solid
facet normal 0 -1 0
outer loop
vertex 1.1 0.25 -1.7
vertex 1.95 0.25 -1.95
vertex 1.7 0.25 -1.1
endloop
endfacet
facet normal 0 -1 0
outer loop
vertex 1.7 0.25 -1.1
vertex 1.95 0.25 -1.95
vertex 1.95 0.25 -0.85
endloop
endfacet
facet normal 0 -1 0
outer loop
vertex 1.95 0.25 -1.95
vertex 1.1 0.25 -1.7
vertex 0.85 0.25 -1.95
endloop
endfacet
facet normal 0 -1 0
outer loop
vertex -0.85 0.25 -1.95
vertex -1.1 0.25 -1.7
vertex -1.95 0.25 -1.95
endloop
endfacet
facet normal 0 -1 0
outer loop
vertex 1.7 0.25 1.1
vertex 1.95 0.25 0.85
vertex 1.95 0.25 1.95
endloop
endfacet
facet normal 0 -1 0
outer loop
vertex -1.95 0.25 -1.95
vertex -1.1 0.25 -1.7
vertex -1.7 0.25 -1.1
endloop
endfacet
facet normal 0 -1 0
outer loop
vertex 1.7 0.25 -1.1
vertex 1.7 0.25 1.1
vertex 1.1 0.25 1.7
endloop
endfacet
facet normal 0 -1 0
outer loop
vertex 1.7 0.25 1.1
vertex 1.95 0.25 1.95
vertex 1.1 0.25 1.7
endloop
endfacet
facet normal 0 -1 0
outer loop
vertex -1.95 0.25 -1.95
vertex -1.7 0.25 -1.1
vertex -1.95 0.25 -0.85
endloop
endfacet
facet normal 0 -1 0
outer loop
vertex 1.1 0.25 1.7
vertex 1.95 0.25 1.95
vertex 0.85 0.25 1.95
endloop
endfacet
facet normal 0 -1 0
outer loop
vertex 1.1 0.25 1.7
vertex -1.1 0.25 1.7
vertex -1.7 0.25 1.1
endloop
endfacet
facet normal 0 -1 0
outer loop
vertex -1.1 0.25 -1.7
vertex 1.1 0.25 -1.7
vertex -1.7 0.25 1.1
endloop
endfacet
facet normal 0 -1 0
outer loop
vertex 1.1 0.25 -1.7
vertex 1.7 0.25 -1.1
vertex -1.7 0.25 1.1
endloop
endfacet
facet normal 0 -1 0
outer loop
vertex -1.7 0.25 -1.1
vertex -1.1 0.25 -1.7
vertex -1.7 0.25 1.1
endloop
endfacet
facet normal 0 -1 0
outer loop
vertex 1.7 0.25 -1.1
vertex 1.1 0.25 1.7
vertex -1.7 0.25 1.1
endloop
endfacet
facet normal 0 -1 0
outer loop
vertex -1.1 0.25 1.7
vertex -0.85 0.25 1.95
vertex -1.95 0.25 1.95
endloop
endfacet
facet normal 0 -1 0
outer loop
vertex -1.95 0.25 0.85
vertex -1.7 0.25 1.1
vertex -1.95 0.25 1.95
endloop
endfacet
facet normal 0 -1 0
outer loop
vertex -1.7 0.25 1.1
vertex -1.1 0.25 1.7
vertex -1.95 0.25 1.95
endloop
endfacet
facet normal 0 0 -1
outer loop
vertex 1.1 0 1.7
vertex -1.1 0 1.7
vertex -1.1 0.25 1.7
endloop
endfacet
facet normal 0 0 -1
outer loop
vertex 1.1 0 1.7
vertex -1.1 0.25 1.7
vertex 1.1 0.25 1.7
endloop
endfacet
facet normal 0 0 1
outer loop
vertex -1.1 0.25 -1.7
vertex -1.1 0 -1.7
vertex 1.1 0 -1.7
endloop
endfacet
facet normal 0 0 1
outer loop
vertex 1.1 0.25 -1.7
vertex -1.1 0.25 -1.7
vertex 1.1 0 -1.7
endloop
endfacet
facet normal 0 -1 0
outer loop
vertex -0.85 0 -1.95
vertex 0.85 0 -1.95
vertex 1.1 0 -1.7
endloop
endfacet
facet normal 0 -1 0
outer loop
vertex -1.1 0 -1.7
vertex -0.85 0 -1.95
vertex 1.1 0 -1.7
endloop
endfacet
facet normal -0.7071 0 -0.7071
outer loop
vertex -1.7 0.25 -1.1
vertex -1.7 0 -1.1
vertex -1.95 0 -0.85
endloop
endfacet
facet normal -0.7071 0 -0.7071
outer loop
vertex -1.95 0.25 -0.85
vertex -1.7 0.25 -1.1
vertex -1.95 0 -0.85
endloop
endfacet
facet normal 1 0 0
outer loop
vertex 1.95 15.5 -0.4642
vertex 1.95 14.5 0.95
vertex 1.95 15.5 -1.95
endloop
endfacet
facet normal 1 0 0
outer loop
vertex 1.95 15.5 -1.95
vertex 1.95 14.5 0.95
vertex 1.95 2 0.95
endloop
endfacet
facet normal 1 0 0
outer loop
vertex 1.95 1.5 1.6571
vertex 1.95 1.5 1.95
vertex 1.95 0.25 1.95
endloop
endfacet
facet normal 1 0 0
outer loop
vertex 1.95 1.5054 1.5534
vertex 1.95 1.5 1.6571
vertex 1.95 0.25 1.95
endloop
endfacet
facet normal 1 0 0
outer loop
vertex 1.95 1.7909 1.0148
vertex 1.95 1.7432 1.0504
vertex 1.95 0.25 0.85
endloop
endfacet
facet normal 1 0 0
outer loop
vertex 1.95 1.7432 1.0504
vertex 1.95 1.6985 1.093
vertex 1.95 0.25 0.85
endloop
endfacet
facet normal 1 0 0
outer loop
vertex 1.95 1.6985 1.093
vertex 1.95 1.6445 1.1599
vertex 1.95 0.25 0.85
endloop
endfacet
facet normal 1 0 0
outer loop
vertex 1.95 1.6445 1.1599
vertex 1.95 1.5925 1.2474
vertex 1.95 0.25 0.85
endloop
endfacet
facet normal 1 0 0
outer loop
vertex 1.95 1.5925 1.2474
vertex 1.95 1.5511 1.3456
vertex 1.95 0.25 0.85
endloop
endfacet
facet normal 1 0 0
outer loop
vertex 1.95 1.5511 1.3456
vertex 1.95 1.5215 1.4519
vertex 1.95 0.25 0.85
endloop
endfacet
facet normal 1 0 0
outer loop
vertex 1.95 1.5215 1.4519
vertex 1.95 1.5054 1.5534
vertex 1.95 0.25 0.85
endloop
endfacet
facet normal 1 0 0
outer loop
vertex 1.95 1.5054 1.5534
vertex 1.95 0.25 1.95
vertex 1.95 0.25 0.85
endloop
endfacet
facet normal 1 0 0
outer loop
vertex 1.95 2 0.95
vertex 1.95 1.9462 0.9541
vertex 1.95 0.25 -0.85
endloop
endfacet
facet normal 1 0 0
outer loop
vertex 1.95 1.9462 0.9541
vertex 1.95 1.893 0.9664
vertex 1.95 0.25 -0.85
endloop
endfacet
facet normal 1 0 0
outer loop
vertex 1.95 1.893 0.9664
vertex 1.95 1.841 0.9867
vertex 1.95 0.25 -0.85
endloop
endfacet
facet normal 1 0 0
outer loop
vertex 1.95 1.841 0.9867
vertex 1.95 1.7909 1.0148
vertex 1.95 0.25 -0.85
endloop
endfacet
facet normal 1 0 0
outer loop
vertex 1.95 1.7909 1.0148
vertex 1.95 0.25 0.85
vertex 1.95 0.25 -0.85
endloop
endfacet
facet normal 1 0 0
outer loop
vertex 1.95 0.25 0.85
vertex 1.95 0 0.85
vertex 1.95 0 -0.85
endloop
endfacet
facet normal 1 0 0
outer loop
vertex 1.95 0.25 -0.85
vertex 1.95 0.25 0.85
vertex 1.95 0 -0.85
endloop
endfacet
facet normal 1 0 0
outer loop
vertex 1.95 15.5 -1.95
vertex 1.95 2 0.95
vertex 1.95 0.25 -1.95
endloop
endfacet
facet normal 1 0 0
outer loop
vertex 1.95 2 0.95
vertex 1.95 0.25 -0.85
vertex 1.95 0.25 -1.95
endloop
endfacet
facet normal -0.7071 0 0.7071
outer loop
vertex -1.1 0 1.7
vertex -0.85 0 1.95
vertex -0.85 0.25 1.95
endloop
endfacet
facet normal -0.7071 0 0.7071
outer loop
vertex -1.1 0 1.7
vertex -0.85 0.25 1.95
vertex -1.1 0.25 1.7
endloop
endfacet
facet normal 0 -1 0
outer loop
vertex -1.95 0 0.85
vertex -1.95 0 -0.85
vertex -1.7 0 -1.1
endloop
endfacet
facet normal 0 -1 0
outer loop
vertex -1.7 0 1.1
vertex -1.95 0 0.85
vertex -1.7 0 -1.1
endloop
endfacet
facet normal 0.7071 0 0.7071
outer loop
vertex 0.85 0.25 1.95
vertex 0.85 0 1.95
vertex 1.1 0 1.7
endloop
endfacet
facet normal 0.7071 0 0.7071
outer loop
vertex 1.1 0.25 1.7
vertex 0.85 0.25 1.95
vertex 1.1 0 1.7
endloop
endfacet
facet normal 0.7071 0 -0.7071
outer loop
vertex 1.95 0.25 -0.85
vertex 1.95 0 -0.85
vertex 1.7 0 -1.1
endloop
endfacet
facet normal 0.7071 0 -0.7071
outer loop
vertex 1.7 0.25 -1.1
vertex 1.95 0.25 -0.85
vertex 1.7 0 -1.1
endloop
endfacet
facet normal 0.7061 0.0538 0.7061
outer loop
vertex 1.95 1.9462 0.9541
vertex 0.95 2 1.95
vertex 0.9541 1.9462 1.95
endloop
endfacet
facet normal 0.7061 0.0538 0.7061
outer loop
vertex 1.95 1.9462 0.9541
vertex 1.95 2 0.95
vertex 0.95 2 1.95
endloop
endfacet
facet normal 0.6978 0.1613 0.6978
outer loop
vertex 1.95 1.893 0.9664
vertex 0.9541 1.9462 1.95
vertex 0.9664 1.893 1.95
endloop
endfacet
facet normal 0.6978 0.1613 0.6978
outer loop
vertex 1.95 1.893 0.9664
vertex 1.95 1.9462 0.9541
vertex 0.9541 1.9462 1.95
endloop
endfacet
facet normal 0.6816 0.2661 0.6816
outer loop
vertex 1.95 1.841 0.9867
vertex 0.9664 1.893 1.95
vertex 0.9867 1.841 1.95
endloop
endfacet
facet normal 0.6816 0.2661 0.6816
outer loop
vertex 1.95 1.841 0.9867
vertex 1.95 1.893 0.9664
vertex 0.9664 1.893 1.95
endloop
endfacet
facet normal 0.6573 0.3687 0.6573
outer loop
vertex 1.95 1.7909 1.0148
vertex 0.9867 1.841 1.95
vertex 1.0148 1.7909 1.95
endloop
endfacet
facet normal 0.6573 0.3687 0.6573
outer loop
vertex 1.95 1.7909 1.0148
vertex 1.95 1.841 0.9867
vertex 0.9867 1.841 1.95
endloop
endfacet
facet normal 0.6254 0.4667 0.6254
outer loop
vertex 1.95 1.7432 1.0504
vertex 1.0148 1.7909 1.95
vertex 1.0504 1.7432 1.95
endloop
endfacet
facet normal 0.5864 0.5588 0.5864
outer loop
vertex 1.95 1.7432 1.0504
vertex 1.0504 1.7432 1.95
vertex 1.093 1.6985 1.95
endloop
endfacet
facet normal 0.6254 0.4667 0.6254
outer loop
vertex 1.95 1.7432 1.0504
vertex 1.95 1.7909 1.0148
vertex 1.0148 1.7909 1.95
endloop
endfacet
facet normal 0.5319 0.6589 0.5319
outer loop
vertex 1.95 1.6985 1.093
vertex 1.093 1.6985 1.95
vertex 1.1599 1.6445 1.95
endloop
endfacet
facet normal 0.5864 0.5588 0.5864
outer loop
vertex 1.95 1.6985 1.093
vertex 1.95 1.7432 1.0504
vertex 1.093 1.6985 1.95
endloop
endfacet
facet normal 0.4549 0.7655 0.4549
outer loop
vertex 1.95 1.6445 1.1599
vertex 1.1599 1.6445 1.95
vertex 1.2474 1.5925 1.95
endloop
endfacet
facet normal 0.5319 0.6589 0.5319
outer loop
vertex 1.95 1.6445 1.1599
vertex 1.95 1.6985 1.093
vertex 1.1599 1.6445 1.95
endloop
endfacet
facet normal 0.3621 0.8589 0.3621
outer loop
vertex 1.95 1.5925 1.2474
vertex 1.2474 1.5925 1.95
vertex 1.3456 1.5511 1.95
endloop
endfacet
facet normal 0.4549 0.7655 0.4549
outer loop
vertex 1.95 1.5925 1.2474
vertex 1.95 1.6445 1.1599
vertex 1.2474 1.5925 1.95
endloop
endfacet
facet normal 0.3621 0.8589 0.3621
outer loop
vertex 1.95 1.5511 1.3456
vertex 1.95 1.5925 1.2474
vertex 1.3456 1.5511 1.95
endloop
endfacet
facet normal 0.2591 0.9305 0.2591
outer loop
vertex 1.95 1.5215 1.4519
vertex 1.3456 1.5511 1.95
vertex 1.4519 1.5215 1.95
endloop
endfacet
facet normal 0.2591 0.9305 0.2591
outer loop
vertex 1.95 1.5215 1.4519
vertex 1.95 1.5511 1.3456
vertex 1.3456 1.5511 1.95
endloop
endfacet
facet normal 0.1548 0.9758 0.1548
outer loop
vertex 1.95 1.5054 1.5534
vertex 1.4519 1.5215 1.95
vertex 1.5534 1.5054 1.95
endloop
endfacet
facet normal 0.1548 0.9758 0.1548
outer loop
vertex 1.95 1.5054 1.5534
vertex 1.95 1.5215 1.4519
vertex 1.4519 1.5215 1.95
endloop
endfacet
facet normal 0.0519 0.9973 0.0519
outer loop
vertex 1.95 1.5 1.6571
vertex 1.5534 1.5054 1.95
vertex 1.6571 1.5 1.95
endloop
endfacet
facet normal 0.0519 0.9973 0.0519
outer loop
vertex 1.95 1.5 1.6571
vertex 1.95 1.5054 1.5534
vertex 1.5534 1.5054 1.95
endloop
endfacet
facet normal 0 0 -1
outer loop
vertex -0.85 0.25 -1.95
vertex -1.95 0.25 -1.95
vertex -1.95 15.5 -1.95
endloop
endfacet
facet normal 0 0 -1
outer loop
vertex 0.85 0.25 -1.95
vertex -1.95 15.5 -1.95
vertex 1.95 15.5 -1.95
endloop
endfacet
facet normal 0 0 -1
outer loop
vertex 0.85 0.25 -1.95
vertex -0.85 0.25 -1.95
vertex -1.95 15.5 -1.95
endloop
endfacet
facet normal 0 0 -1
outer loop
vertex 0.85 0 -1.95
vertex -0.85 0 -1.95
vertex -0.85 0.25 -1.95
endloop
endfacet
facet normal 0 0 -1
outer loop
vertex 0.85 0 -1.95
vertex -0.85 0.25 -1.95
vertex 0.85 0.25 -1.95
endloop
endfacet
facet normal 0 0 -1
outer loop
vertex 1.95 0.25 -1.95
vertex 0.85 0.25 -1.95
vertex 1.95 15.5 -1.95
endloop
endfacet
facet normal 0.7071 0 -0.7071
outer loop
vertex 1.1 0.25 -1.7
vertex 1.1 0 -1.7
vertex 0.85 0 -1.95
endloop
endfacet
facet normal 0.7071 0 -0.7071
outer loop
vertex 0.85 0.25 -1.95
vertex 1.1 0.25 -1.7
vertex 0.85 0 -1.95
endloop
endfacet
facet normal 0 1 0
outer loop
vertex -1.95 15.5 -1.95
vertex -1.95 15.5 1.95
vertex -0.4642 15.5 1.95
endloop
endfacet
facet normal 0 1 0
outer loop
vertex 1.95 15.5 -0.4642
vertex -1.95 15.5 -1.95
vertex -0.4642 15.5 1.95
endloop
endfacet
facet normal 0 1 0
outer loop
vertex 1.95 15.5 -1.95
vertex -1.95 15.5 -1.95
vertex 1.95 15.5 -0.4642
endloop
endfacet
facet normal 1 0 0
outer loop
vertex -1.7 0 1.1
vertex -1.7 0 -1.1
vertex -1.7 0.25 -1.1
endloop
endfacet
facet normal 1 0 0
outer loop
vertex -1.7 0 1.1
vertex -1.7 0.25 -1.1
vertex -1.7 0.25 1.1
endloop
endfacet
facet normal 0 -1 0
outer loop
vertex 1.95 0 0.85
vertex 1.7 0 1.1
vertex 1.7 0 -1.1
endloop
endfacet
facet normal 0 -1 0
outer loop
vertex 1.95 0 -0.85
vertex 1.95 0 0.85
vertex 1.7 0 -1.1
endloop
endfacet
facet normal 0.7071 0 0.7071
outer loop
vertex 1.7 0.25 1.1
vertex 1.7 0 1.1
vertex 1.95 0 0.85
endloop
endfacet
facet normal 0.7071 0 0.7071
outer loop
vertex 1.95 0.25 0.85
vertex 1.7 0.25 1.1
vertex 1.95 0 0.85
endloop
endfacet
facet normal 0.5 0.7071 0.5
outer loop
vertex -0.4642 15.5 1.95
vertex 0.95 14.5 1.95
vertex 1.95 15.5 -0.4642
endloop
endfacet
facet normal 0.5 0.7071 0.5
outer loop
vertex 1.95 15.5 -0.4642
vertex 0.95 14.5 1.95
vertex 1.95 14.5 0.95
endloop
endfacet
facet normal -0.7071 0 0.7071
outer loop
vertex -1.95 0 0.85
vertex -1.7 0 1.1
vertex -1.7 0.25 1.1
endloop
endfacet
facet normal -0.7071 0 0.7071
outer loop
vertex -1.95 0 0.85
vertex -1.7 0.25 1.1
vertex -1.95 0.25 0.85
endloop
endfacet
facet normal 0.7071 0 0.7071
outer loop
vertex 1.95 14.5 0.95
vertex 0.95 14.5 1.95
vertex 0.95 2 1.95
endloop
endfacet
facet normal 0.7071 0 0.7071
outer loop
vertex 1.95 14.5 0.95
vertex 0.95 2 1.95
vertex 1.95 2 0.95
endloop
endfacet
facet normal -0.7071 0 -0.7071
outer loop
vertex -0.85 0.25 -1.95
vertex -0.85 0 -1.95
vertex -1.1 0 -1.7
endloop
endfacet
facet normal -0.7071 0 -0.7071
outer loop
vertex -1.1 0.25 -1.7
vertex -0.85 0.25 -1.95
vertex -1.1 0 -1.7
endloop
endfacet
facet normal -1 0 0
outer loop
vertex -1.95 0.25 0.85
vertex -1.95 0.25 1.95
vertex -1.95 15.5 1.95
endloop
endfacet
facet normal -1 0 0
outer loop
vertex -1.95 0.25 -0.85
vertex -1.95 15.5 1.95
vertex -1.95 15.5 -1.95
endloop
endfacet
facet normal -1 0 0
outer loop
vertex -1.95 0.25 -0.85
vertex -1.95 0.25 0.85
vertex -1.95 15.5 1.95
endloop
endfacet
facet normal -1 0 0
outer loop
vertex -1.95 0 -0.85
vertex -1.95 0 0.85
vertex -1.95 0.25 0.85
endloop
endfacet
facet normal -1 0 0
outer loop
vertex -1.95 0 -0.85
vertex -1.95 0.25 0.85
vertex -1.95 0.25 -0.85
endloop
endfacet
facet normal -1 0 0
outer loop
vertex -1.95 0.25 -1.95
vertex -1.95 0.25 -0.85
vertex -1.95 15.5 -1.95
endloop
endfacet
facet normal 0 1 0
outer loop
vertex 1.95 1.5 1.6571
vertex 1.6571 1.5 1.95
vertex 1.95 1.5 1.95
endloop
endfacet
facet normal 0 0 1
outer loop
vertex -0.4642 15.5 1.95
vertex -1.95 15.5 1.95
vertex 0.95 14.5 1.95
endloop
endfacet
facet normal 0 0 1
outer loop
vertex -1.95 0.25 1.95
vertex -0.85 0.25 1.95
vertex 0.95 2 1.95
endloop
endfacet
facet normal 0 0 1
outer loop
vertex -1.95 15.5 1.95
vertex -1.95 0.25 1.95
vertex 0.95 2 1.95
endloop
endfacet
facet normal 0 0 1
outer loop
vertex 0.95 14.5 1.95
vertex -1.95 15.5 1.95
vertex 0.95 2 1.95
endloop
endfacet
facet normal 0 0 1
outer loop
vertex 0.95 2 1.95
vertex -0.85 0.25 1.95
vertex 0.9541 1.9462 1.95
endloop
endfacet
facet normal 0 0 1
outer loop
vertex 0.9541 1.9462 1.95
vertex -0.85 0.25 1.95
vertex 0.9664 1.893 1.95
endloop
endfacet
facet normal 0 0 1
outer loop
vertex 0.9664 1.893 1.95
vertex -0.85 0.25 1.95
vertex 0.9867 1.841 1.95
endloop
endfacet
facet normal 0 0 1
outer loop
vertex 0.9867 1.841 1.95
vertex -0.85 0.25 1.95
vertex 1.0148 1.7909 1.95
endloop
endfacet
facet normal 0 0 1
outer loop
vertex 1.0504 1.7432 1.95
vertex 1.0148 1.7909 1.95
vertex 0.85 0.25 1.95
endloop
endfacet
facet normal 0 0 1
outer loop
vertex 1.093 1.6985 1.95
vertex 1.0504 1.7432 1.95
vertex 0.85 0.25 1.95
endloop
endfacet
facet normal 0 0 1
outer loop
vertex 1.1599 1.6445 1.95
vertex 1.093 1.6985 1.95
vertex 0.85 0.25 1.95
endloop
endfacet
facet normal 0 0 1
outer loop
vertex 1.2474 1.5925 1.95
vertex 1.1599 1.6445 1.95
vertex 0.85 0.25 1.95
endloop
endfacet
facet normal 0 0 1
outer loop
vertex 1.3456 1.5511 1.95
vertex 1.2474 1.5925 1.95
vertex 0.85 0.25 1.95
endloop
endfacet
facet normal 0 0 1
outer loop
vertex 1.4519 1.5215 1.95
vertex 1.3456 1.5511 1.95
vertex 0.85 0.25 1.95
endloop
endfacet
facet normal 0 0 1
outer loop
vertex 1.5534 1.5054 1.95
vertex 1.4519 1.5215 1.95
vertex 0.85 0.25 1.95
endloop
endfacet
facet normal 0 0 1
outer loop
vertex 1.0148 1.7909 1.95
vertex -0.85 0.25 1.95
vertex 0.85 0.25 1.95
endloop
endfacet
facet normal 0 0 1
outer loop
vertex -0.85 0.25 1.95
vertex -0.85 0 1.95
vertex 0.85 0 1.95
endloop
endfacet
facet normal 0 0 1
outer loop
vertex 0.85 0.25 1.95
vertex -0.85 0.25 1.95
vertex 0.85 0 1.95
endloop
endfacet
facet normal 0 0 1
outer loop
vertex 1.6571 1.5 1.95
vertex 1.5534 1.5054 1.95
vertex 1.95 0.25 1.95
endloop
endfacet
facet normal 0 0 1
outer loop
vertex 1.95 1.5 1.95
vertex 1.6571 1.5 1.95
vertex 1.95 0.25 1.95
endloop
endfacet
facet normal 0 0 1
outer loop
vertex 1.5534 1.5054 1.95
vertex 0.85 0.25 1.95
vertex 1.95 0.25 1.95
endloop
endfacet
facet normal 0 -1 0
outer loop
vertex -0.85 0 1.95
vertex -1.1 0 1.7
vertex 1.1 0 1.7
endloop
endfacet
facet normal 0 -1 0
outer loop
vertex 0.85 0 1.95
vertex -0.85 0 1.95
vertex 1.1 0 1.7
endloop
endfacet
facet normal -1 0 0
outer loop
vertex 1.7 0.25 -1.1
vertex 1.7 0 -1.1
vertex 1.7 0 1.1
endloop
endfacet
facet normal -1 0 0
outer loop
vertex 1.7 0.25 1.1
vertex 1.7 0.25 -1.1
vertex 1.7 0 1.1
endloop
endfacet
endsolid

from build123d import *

# Parameters (mm, degrees)
SKETCH1_W           = 3.9
SKETCH1_H           = 3.9
BOSS_EXTRUDE1_DEPTH = 15.5
SKETCH3_W           = 2
SKETCH3_H           = 14
CUT_EXTRUDE1_DEPTH  = 17.22867832
SKETCH4_W           = 3.4
SKETCH4_H           = 3.4
CUT_EXTRUDE2_DEPTH  = 0.25
CUT_EXTRUDE3_DEPTH  = 0.25
CHAMFER1_SIZE       = 1
FILLET1_R           = 0.5


with BuildPart() as part:
    # Sketch1 → Boss-Extrude1 (new body)
    with BuildSketch(Plane(origin=(0, 0, 0), x_dir=(1, 0, 0), z_dir=(0, 1, 0))):
        Rectangle(SKETCH1_W, SKETCH1_H)
    extrude(amount=BOSS_EXTRUDE1_DEPTH)

    # Sketch3 → Cut-Extrude1 (cut, through all)
    with BuildSketch(Plane(origin=(1.45, 0, 1.45), x_dir=(0.7071067811865475, 0, -0.7071067811865476), z_dir=(0.7071067811865476, 0, 0.7071067811865475))):
        with Locations((0, 8.5)):
            Rectangle(SKETCH3_W, SKETCH3_H)
    extrude(amount=CUT_EXTRUDE1_DEPTH, mode=Mode.SUBTRACT)

    # Sketch4 → Cut-Extrude2 (cut)
    with BuildSketch(Plane.XZ):
        Rectangle(SKETCH4_W, SKETCH4_H)
    extrude(amount=-CUT_EXTRUDE2_DEPTH, mode=Mode.SUBTRACT)

    # Sketch5 → Cut-Extrude3 (cut)
    with BuildSketch(Plane.XZ):
        Polygon((1.95, 1.95), (0.85, 1.95), (1.95, 0.85), align=None)
        Polygon((1.95, -1.95), (1.95, -0.85), (0.85, -1.95), align=None)
        Polygon((-1.95, 1.95), (-0.85, 1.95), (-1.95, 0.85), align=None)
        Polygon((-1.95, -1.95), (-0.85, -1.95), (-1.95, -0.85), align=None)
    extrude(amount=-CUT_EXTRUDE3_DEPTH, mode=Mode.SUBTRACT)

    # Chamfer1
    chamfer1_edges = [part.edges().sort_by_distance(p)[0] for p in [
        (1.45, 15.5, 1.45),
    ]]
    chamfer(chamfer1_edges, length=CHAMFER1_SIZE)

    # Fillet1
    fillet1_edges = [part.edges().sort_by_distance(p)[0] for p in [
        (1.45, 1.5, 1.45),
    ]]
    fillet(fillet1_edges, radius=FILLET1_R)


solid = part.part
